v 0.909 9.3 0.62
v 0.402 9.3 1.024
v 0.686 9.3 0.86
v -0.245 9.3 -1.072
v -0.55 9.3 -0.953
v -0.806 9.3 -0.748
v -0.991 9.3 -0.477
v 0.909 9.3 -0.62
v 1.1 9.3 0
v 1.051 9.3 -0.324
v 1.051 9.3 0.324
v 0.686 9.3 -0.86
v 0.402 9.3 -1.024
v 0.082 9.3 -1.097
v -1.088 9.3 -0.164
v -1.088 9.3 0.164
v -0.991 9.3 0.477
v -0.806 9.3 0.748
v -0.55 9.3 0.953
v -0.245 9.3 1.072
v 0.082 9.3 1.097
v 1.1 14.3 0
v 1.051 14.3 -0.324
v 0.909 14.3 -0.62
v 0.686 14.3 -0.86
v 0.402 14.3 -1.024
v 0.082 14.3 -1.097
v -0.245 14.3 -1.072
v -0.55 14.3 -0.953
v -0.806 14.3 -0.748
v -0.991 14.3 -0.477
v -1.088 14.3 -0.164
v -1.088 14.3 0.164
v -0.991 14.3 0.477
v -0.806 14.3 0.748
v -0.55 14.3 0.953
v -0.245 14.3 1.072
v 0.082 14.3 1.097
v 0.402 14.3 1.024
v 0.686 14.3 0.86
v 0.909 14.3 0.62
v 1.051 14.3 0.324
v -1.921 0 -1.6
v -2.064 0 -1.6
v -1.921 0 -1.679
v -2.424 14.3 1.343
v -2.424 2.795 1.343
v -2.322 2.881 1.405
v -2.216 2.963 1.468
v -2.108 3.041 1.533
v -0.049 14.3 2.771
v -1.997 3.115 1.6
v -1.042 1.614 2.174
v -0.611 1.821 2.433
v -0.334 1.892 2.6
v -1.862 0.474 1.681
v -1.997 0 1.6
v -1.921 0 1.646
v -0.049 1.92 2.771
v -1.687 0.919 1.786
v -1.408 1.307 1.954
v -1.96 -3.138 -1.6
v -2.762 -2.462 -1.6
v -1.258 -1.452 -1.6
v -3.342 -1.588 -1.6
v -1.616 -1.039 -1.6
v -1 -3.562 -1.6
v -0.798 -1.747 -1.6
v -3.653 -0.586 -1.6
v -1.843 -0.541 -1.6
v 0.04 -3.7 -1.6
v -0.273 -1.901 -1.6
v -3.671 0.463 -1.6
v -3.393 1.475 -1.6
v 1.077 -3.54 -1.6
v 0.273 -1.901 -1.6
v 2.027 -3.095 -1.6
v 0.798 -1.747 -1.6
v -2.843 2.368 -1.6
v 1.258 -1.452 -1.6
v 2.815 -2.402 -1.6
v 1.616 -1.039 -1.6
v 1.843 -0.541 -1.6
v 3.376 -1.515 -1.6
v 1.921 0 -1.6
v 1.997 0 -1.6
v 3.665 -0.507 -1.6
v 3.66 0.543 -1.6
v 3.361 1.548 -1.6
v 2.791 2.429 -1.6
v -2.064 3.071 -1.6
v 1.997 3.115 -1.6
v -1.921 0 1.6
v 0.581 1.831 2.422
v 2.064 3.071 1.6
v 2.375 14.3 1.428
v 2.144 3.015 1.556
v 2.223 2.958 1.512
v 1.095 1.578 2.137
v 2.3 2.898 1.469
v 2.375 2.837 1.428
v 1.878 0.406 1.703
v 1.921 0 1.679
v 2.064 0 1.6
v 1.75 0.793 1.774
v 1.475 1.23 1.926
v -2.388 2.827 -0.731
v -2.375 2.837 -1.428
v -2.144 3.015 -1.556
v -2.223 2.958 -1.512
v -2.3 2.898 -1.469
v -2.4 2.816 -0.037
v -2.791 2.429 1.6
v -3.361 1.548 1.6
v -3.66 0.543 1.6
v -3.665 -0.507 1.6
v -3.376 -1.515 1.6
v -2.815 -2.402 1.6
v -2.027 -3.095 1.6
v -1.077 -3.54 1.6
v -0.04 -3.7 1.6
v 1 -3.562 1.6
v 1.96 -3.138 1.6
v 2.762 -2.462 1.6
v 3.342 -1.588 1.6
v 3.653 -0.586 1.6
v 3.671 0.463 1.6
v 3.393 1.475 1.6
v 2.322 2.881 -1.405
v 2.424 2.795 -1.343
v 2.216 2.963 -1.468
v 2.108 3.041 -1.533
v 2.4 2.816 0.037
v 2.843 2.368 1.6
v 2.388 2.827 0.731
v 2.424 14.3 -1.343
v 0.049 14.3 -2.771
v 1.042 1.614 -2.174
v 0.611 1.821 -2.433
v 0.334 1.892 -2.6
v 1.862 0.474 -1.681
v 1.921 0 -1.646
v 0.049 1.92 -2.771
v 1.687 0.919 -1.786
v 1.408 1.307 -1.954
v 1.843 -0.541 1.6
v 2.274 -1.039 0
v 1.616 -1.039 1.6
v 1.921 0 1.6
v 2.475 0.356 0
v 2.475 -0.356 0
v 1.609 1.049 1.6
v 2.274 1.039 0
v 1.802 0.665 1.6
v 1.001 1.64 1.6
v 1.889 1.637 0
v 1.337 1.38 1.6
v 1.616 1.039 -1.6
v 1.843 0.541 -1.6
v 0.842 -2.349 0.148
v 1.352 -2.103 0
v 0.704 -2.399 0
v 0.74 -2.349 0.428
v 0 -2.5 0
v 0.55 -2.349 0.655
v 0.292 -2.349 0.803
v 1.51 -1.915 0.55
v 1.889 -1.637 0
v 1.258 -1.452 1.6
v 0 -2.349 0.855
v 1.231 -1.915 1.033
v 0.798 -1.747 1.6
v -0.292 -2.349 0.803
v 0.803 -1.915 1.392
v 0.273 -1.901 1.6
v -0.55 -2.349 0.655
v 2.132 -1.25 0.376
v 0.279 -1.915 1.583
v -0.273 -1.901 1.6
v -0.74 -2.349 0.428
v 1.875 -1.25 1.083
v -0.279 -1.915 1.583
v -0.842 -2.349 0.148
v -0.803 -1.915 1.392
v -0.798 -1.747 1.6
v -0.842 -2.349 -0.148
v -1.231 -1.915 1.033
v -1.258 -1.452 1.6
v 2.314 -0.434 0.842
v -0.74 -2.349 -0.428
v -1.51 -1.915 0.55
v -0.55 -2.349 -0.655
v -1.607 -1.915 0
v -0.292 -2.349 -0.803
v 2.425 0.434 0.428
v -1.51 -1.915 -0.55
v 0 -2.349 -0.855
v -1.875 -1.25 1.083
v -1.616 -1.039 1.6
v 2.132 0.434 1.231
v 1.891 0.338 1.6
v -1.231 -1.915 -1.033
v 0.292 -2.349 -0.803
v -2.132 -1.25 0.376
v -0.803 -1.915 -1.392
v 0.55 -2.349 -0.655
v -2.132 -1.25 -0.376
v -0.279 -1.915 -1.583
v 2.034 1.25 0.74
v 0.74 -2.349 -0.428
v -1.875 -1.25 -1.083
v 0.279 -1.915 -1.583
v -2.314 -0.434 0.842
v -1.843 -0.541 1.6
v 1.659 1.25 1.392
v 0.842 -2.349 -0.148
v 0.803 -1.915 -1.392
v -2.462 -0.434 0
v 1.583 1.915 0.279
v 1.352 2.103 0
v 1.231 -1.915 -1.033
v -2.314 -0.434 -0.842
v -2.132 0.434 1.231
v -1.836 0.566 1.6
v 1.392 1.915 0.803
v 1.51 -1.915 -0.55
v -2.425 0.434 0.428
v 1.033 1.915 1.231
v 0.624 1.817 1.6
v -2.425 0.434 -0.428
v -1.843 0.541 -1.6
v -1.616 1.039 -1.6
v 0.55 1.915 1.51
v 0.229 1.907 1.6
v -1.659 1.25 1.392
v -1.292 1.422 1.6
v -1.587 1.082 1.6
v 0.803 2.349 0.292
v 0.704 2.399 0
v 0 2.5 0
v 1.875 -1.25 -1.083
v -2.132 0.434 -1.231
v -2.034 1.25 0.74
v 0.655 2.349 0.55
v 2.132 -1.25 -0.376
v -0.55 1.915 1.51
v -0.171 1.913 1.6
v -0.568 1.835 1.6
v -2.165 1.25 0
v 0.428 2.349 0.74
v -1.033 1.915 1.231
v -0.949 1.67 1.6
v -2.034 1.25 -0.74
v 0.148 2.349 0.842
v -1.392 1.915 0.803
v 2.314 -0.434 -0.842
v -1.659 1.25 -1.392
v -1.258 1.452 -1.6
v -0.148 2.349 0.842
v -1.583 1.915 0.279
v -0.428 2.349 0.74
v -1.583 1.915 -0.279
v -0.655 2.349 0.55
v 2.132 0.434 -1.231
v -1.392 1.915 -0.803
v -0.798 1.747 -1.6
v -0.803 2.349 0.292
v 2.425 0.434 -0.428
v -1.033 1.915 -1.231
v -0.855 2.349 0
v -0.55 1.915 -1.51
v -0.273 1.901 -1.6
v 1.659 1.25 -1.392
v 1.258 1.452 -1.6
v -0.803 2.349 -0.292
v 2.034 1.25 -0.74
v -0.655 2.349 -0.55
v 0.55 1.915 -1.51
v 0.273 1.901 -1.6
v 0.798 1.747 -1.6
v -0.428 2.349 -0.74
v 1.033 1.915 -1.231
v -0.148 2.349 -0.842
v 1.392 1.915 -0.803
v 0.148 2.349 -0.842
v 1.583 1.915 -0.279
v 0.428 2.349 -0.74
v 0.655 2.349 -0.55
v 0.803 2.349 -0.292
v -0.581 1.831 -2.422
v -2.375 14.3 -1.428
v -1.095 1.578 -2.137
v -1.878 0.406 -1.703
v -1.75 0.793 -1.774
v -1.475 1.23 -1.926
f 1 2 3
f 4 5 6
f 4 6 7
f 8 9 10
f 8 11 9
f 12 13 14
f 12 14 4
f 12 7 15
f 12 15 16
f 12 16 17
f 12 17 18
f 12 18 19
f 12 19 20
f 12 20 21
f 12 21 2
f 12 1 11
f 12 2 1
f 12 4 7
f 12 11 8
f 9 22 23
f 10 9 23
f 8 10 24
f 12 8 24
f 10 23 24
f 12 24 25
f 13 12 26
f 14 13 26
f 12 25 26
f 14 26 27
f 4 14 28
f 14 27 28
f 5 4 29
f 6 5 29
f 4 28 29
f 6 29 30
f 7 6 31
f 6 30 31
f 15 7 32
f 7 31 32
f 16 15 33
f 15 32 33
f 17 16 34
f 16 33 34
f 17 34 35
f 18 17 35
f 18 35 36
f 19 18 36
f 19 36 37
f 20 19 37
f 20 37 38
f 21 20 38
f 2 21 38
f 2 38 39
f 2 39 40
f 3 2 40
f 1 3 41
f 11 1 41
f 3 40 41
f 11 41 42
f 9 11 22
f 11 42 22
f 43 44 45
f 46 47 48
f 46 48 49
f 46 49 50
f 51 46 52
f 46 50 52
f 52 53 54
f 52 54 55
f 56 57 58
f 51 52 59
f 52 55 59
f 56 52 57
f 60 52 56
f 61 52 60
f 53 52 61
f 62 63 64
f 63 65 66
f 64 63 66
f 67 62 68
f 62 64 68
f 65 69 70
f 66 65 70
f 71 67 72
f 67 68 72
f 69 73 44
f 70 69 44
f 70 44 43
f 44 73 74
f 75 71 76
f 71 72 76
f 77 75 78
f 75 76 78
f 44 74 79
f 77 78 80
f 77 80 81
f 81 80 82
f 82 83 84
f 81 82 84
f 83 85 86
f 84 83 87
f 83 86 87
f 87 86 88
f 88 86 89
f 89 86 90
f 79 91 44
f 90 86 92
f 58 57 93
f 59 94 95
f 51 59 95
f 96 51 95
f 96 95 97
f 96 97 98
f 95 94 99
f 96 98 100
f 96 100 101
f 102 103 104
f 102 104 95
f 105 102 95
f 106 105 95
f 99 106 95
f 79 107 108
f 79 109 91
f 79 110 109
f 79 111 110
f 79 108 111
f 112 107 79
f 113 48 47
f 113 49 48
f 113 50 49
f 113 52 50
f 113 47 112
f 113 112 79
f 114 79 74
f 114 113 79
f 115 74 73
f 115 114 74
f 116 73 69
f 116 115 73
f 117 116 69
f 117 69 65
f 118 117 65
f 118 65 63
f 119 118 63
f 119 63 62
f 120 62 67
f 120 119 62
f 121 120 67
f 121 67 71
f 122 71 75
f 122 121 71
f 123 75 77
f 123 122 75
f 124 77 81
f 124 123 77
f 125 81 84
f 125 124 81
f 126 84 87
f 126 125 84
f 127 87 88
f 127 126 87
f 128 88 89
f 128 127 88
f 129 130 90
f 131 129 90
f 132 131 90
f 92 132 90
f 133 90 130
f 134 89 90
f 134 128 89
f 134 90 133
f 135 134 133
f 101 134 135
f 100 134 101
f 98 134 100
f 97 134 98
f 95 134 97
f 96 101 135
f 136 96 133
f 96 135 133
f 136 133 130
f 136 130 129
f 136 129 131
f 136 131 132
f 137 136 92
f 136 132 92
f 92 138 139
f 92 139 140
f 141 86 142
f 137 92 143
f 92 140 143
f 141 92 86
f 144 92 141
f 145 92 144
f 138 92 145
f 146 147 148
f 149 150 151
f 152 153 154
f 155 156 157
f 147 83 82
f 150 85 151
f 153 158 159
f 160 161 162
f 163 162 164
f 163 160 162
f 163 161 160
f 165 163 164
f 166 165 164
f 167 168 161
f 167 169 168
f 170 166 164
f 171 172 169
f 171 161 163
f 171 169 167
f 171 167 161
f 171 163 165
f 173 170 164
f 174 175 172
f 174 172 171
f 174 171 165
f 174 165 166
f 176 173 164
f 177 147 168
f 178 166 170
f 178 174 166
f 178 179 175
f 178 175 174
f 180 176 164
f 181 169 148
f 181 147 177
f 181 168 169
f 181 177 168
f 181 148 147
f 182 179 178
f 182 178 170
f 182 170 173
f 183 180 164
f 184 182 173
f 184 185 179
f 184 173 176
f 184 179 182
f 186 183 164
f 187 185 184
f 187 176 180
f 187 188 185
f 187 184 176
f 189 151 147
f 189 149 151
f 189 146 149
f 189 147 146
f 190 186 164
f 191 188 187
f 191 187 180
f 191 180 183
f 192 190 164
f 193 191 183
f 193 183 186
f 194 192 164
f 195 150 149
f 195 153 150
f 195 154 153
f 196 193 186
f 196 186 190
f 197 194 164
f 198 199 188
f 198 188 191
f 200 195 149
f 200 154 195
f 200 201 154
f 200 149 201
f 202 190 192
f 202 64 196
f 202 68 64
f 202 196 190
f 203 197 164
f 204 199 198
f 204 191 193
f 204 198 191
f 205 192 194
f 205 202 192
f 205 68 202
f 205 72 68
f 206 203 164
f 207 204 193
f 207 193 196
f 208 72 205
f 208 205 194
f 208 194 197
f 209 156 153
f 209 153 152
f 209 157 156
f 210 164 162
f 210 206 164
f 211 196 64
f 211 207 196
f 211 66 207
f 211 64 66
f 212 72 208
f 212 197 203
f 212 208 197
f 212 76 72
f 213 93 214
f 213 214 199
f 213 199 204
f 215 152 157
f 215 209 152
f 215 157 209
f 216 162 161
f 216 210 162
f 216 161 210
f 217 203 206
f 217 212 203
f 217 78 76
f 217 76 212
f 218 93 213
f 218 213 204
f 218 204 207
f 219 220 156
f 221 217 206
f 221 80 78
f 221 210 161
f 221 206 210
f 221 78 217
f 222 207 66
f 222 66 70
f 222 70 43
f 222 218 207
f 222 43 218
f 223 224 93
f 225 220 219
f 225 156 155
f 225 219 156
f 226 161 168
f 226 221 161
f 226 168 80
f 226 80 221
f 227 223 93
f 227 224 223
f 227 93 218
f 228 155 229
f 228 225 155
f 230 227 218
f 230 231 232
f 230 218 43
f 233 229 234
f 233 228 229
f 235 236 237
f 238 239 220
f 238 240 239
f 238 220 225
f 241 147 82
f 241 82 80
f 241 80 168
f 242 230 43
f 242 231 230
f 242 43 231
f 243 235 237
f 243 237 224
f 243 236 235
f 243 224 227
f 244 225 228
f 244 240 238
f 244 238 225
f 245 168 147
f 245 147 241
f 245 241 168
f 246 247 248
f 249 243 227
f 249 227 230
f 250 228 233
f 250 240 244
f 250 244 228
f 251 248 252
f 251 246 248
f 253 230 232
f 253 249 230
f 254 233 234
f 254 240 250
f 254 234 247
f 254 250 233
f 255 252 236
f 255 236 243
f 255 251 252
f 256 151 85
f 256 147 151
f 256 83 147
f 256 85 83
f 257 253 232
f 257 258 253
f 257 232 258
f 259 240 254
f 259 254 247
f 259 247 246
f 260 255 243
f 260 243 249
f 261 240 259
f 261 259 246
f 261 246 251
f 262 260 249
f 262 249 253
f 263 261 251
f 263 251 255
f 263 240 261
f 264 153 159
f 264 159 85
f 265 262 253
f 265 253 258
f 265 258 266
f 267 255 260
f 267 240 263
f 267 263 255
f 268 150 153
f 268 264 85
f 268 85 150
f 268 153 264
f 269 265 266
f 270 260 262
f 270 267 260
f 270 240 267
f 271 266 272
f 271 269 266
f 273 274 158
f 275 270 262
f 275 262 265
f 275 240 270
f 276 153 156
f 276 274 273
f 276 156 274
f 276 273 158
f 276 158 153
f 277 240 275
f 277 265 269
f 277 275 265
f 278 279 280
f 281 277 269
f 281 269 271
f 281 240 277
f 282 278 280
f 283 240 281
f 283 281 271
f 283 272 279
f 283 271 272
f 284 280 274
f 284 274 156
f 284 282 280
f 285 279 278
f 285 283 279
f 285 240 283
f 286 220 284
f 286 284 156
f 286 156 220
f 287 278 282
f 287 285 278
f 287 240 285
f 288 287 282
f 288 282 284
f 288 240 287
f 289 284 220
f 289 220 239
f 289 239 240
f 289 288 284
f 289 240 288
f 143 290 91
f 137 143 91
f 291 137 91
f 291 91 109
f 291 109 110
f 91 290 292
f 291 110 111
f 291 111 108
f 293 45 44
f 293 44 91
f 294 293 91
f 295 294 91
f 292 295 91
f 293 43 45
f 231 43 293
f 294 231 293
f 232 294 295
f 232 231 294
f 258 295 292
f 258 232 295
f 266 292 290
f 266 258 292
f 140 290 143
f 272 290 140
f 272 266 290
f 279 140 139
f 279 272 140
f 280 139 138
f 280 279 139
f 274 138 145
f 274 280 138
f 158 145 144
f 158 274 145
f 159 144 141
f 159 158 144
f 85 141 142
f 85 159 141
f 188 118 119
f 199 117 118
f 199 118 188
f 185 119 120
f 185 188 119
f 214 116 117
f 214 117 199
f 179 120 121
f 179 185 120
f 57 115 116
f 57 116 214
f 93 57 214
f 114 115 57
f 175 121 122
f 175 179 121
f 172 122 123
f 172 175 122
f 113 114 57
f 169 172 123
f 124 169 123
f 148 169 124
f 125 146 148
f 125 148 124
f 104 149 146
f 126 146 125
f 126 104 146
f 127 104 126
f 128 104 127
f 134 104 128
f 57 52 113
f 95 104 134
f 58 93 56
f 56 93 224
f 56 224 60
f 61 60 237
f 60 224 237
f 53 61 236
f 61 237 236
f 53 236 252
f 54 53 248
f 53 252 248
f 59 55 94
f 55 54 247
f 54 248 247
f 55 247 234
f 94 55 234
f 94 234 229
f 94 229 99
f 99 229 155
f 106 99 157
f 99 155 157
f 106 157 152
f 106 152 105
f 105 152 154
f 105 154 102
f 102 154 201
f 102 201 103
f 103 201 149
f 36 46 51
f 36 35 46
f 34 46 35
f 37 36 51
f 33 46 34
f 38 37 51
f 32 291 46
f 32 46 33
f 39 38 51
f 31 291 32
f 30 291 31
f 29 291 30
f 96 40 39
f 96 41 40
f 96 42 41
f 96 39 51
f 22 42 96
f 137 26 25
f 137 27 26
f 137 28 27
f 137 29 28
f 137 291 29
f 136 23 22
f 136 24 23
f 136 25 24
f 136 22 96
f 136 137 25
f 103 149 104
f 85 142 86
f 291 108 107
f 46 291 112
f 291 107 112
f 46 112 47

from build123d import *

# Parameters (mm, degrees)
EXTRUDE_1_DEPTH          = 1.6
EXTRUDE_1_DEPTH_BACK     = 1.6
SKETCH_1_R               = 3.7
EXTRUDE_3_DEPTH          = 14.3
SKETCH_9_R               = 1.1
CUT_EXTRUDE_1_DEPTH      = 5
CUT_EXTRUDE_2_DEPTH      = 16.404037189
CUT_EXTRUDE_2_DEPTH_BACK = 16.404037189
SKETCH_10_R              = 1.920937271


with BuildPart() as part:
    # 草圖1 → 填料-伸長1 (new, two sides: drawn at the far end of the back side and taken through both)
    with BuildSketch(Plane.XY.offset(-EXTRUDE_1_DEPTH_BACK)):
        Circle(SKETCH_1_R)
    extrude(amount=EXTRUDE_1_DEPTH + EXTRUDE_1_DEPTH_BACK)

    # 草圖8 → 填料-伸長3 (add)
    with BuildSketch(Plane(origin=(0, 0, 0), x_dir=(1, 0, 0), z_dir=(0, 1, 0))):
        Polygon((0.048682641, 2.770853659), (-2.375288338, 1.427587234), (-2.42397098, -1.343266426), (-0.048682641, -2.770853659), (2.375288338, -1.427587234), (2.42397098, 1.343266426), align=None)
    extrude(amount=EXTRUDE_3_DEPTH)

    # 草圖7 → 除料-旋轉7 (revolve, cut)
    with BuildSketch(Plane.XY):
        with BuildLine():
            Line((0, 2.5), (0, -2.5))
            ThreePointArc((0, -2.5), (2.5, 0), (0, 2.5))
        make_face()
    revolve(axis=Axis((0, 2.5, 0), (0, -1, 0)), mode=Mode.SUBTRACT)

    # 草圖9 → 除料-伸長1 (cut)
    with BuildSketch(Plane(origin=(0, 14.3, 0), x_dir=(1, 0, 0), z_dir=(0, 1, 0))):
        Circle(SKETCH_9_R)
    extrude(amount=-CUT_EXTRUDE_1_DEPTH, mode=Mode.SUBTRACT)

    # 草圖10 → 除料-伸長2 (cut, two sides: drawn at the far end of the back side and taken through both)
    with BuildSketch(Plane(origin=(0, 0, -1.6), x_dir=(-1, 0, 0), z_dir=(0, 0, -1)).offset(-CUT_EXTRUDE_2_DEPTH_BACK)):
        Circle(SKETCH_10_R)
    extrude(amount=CUT_EXTRUDE_2_DEPTH + CUT_EXTRUDE_2_DEPTH_BACK, mode=Mode.SUBTRACT)


solid = part.part
